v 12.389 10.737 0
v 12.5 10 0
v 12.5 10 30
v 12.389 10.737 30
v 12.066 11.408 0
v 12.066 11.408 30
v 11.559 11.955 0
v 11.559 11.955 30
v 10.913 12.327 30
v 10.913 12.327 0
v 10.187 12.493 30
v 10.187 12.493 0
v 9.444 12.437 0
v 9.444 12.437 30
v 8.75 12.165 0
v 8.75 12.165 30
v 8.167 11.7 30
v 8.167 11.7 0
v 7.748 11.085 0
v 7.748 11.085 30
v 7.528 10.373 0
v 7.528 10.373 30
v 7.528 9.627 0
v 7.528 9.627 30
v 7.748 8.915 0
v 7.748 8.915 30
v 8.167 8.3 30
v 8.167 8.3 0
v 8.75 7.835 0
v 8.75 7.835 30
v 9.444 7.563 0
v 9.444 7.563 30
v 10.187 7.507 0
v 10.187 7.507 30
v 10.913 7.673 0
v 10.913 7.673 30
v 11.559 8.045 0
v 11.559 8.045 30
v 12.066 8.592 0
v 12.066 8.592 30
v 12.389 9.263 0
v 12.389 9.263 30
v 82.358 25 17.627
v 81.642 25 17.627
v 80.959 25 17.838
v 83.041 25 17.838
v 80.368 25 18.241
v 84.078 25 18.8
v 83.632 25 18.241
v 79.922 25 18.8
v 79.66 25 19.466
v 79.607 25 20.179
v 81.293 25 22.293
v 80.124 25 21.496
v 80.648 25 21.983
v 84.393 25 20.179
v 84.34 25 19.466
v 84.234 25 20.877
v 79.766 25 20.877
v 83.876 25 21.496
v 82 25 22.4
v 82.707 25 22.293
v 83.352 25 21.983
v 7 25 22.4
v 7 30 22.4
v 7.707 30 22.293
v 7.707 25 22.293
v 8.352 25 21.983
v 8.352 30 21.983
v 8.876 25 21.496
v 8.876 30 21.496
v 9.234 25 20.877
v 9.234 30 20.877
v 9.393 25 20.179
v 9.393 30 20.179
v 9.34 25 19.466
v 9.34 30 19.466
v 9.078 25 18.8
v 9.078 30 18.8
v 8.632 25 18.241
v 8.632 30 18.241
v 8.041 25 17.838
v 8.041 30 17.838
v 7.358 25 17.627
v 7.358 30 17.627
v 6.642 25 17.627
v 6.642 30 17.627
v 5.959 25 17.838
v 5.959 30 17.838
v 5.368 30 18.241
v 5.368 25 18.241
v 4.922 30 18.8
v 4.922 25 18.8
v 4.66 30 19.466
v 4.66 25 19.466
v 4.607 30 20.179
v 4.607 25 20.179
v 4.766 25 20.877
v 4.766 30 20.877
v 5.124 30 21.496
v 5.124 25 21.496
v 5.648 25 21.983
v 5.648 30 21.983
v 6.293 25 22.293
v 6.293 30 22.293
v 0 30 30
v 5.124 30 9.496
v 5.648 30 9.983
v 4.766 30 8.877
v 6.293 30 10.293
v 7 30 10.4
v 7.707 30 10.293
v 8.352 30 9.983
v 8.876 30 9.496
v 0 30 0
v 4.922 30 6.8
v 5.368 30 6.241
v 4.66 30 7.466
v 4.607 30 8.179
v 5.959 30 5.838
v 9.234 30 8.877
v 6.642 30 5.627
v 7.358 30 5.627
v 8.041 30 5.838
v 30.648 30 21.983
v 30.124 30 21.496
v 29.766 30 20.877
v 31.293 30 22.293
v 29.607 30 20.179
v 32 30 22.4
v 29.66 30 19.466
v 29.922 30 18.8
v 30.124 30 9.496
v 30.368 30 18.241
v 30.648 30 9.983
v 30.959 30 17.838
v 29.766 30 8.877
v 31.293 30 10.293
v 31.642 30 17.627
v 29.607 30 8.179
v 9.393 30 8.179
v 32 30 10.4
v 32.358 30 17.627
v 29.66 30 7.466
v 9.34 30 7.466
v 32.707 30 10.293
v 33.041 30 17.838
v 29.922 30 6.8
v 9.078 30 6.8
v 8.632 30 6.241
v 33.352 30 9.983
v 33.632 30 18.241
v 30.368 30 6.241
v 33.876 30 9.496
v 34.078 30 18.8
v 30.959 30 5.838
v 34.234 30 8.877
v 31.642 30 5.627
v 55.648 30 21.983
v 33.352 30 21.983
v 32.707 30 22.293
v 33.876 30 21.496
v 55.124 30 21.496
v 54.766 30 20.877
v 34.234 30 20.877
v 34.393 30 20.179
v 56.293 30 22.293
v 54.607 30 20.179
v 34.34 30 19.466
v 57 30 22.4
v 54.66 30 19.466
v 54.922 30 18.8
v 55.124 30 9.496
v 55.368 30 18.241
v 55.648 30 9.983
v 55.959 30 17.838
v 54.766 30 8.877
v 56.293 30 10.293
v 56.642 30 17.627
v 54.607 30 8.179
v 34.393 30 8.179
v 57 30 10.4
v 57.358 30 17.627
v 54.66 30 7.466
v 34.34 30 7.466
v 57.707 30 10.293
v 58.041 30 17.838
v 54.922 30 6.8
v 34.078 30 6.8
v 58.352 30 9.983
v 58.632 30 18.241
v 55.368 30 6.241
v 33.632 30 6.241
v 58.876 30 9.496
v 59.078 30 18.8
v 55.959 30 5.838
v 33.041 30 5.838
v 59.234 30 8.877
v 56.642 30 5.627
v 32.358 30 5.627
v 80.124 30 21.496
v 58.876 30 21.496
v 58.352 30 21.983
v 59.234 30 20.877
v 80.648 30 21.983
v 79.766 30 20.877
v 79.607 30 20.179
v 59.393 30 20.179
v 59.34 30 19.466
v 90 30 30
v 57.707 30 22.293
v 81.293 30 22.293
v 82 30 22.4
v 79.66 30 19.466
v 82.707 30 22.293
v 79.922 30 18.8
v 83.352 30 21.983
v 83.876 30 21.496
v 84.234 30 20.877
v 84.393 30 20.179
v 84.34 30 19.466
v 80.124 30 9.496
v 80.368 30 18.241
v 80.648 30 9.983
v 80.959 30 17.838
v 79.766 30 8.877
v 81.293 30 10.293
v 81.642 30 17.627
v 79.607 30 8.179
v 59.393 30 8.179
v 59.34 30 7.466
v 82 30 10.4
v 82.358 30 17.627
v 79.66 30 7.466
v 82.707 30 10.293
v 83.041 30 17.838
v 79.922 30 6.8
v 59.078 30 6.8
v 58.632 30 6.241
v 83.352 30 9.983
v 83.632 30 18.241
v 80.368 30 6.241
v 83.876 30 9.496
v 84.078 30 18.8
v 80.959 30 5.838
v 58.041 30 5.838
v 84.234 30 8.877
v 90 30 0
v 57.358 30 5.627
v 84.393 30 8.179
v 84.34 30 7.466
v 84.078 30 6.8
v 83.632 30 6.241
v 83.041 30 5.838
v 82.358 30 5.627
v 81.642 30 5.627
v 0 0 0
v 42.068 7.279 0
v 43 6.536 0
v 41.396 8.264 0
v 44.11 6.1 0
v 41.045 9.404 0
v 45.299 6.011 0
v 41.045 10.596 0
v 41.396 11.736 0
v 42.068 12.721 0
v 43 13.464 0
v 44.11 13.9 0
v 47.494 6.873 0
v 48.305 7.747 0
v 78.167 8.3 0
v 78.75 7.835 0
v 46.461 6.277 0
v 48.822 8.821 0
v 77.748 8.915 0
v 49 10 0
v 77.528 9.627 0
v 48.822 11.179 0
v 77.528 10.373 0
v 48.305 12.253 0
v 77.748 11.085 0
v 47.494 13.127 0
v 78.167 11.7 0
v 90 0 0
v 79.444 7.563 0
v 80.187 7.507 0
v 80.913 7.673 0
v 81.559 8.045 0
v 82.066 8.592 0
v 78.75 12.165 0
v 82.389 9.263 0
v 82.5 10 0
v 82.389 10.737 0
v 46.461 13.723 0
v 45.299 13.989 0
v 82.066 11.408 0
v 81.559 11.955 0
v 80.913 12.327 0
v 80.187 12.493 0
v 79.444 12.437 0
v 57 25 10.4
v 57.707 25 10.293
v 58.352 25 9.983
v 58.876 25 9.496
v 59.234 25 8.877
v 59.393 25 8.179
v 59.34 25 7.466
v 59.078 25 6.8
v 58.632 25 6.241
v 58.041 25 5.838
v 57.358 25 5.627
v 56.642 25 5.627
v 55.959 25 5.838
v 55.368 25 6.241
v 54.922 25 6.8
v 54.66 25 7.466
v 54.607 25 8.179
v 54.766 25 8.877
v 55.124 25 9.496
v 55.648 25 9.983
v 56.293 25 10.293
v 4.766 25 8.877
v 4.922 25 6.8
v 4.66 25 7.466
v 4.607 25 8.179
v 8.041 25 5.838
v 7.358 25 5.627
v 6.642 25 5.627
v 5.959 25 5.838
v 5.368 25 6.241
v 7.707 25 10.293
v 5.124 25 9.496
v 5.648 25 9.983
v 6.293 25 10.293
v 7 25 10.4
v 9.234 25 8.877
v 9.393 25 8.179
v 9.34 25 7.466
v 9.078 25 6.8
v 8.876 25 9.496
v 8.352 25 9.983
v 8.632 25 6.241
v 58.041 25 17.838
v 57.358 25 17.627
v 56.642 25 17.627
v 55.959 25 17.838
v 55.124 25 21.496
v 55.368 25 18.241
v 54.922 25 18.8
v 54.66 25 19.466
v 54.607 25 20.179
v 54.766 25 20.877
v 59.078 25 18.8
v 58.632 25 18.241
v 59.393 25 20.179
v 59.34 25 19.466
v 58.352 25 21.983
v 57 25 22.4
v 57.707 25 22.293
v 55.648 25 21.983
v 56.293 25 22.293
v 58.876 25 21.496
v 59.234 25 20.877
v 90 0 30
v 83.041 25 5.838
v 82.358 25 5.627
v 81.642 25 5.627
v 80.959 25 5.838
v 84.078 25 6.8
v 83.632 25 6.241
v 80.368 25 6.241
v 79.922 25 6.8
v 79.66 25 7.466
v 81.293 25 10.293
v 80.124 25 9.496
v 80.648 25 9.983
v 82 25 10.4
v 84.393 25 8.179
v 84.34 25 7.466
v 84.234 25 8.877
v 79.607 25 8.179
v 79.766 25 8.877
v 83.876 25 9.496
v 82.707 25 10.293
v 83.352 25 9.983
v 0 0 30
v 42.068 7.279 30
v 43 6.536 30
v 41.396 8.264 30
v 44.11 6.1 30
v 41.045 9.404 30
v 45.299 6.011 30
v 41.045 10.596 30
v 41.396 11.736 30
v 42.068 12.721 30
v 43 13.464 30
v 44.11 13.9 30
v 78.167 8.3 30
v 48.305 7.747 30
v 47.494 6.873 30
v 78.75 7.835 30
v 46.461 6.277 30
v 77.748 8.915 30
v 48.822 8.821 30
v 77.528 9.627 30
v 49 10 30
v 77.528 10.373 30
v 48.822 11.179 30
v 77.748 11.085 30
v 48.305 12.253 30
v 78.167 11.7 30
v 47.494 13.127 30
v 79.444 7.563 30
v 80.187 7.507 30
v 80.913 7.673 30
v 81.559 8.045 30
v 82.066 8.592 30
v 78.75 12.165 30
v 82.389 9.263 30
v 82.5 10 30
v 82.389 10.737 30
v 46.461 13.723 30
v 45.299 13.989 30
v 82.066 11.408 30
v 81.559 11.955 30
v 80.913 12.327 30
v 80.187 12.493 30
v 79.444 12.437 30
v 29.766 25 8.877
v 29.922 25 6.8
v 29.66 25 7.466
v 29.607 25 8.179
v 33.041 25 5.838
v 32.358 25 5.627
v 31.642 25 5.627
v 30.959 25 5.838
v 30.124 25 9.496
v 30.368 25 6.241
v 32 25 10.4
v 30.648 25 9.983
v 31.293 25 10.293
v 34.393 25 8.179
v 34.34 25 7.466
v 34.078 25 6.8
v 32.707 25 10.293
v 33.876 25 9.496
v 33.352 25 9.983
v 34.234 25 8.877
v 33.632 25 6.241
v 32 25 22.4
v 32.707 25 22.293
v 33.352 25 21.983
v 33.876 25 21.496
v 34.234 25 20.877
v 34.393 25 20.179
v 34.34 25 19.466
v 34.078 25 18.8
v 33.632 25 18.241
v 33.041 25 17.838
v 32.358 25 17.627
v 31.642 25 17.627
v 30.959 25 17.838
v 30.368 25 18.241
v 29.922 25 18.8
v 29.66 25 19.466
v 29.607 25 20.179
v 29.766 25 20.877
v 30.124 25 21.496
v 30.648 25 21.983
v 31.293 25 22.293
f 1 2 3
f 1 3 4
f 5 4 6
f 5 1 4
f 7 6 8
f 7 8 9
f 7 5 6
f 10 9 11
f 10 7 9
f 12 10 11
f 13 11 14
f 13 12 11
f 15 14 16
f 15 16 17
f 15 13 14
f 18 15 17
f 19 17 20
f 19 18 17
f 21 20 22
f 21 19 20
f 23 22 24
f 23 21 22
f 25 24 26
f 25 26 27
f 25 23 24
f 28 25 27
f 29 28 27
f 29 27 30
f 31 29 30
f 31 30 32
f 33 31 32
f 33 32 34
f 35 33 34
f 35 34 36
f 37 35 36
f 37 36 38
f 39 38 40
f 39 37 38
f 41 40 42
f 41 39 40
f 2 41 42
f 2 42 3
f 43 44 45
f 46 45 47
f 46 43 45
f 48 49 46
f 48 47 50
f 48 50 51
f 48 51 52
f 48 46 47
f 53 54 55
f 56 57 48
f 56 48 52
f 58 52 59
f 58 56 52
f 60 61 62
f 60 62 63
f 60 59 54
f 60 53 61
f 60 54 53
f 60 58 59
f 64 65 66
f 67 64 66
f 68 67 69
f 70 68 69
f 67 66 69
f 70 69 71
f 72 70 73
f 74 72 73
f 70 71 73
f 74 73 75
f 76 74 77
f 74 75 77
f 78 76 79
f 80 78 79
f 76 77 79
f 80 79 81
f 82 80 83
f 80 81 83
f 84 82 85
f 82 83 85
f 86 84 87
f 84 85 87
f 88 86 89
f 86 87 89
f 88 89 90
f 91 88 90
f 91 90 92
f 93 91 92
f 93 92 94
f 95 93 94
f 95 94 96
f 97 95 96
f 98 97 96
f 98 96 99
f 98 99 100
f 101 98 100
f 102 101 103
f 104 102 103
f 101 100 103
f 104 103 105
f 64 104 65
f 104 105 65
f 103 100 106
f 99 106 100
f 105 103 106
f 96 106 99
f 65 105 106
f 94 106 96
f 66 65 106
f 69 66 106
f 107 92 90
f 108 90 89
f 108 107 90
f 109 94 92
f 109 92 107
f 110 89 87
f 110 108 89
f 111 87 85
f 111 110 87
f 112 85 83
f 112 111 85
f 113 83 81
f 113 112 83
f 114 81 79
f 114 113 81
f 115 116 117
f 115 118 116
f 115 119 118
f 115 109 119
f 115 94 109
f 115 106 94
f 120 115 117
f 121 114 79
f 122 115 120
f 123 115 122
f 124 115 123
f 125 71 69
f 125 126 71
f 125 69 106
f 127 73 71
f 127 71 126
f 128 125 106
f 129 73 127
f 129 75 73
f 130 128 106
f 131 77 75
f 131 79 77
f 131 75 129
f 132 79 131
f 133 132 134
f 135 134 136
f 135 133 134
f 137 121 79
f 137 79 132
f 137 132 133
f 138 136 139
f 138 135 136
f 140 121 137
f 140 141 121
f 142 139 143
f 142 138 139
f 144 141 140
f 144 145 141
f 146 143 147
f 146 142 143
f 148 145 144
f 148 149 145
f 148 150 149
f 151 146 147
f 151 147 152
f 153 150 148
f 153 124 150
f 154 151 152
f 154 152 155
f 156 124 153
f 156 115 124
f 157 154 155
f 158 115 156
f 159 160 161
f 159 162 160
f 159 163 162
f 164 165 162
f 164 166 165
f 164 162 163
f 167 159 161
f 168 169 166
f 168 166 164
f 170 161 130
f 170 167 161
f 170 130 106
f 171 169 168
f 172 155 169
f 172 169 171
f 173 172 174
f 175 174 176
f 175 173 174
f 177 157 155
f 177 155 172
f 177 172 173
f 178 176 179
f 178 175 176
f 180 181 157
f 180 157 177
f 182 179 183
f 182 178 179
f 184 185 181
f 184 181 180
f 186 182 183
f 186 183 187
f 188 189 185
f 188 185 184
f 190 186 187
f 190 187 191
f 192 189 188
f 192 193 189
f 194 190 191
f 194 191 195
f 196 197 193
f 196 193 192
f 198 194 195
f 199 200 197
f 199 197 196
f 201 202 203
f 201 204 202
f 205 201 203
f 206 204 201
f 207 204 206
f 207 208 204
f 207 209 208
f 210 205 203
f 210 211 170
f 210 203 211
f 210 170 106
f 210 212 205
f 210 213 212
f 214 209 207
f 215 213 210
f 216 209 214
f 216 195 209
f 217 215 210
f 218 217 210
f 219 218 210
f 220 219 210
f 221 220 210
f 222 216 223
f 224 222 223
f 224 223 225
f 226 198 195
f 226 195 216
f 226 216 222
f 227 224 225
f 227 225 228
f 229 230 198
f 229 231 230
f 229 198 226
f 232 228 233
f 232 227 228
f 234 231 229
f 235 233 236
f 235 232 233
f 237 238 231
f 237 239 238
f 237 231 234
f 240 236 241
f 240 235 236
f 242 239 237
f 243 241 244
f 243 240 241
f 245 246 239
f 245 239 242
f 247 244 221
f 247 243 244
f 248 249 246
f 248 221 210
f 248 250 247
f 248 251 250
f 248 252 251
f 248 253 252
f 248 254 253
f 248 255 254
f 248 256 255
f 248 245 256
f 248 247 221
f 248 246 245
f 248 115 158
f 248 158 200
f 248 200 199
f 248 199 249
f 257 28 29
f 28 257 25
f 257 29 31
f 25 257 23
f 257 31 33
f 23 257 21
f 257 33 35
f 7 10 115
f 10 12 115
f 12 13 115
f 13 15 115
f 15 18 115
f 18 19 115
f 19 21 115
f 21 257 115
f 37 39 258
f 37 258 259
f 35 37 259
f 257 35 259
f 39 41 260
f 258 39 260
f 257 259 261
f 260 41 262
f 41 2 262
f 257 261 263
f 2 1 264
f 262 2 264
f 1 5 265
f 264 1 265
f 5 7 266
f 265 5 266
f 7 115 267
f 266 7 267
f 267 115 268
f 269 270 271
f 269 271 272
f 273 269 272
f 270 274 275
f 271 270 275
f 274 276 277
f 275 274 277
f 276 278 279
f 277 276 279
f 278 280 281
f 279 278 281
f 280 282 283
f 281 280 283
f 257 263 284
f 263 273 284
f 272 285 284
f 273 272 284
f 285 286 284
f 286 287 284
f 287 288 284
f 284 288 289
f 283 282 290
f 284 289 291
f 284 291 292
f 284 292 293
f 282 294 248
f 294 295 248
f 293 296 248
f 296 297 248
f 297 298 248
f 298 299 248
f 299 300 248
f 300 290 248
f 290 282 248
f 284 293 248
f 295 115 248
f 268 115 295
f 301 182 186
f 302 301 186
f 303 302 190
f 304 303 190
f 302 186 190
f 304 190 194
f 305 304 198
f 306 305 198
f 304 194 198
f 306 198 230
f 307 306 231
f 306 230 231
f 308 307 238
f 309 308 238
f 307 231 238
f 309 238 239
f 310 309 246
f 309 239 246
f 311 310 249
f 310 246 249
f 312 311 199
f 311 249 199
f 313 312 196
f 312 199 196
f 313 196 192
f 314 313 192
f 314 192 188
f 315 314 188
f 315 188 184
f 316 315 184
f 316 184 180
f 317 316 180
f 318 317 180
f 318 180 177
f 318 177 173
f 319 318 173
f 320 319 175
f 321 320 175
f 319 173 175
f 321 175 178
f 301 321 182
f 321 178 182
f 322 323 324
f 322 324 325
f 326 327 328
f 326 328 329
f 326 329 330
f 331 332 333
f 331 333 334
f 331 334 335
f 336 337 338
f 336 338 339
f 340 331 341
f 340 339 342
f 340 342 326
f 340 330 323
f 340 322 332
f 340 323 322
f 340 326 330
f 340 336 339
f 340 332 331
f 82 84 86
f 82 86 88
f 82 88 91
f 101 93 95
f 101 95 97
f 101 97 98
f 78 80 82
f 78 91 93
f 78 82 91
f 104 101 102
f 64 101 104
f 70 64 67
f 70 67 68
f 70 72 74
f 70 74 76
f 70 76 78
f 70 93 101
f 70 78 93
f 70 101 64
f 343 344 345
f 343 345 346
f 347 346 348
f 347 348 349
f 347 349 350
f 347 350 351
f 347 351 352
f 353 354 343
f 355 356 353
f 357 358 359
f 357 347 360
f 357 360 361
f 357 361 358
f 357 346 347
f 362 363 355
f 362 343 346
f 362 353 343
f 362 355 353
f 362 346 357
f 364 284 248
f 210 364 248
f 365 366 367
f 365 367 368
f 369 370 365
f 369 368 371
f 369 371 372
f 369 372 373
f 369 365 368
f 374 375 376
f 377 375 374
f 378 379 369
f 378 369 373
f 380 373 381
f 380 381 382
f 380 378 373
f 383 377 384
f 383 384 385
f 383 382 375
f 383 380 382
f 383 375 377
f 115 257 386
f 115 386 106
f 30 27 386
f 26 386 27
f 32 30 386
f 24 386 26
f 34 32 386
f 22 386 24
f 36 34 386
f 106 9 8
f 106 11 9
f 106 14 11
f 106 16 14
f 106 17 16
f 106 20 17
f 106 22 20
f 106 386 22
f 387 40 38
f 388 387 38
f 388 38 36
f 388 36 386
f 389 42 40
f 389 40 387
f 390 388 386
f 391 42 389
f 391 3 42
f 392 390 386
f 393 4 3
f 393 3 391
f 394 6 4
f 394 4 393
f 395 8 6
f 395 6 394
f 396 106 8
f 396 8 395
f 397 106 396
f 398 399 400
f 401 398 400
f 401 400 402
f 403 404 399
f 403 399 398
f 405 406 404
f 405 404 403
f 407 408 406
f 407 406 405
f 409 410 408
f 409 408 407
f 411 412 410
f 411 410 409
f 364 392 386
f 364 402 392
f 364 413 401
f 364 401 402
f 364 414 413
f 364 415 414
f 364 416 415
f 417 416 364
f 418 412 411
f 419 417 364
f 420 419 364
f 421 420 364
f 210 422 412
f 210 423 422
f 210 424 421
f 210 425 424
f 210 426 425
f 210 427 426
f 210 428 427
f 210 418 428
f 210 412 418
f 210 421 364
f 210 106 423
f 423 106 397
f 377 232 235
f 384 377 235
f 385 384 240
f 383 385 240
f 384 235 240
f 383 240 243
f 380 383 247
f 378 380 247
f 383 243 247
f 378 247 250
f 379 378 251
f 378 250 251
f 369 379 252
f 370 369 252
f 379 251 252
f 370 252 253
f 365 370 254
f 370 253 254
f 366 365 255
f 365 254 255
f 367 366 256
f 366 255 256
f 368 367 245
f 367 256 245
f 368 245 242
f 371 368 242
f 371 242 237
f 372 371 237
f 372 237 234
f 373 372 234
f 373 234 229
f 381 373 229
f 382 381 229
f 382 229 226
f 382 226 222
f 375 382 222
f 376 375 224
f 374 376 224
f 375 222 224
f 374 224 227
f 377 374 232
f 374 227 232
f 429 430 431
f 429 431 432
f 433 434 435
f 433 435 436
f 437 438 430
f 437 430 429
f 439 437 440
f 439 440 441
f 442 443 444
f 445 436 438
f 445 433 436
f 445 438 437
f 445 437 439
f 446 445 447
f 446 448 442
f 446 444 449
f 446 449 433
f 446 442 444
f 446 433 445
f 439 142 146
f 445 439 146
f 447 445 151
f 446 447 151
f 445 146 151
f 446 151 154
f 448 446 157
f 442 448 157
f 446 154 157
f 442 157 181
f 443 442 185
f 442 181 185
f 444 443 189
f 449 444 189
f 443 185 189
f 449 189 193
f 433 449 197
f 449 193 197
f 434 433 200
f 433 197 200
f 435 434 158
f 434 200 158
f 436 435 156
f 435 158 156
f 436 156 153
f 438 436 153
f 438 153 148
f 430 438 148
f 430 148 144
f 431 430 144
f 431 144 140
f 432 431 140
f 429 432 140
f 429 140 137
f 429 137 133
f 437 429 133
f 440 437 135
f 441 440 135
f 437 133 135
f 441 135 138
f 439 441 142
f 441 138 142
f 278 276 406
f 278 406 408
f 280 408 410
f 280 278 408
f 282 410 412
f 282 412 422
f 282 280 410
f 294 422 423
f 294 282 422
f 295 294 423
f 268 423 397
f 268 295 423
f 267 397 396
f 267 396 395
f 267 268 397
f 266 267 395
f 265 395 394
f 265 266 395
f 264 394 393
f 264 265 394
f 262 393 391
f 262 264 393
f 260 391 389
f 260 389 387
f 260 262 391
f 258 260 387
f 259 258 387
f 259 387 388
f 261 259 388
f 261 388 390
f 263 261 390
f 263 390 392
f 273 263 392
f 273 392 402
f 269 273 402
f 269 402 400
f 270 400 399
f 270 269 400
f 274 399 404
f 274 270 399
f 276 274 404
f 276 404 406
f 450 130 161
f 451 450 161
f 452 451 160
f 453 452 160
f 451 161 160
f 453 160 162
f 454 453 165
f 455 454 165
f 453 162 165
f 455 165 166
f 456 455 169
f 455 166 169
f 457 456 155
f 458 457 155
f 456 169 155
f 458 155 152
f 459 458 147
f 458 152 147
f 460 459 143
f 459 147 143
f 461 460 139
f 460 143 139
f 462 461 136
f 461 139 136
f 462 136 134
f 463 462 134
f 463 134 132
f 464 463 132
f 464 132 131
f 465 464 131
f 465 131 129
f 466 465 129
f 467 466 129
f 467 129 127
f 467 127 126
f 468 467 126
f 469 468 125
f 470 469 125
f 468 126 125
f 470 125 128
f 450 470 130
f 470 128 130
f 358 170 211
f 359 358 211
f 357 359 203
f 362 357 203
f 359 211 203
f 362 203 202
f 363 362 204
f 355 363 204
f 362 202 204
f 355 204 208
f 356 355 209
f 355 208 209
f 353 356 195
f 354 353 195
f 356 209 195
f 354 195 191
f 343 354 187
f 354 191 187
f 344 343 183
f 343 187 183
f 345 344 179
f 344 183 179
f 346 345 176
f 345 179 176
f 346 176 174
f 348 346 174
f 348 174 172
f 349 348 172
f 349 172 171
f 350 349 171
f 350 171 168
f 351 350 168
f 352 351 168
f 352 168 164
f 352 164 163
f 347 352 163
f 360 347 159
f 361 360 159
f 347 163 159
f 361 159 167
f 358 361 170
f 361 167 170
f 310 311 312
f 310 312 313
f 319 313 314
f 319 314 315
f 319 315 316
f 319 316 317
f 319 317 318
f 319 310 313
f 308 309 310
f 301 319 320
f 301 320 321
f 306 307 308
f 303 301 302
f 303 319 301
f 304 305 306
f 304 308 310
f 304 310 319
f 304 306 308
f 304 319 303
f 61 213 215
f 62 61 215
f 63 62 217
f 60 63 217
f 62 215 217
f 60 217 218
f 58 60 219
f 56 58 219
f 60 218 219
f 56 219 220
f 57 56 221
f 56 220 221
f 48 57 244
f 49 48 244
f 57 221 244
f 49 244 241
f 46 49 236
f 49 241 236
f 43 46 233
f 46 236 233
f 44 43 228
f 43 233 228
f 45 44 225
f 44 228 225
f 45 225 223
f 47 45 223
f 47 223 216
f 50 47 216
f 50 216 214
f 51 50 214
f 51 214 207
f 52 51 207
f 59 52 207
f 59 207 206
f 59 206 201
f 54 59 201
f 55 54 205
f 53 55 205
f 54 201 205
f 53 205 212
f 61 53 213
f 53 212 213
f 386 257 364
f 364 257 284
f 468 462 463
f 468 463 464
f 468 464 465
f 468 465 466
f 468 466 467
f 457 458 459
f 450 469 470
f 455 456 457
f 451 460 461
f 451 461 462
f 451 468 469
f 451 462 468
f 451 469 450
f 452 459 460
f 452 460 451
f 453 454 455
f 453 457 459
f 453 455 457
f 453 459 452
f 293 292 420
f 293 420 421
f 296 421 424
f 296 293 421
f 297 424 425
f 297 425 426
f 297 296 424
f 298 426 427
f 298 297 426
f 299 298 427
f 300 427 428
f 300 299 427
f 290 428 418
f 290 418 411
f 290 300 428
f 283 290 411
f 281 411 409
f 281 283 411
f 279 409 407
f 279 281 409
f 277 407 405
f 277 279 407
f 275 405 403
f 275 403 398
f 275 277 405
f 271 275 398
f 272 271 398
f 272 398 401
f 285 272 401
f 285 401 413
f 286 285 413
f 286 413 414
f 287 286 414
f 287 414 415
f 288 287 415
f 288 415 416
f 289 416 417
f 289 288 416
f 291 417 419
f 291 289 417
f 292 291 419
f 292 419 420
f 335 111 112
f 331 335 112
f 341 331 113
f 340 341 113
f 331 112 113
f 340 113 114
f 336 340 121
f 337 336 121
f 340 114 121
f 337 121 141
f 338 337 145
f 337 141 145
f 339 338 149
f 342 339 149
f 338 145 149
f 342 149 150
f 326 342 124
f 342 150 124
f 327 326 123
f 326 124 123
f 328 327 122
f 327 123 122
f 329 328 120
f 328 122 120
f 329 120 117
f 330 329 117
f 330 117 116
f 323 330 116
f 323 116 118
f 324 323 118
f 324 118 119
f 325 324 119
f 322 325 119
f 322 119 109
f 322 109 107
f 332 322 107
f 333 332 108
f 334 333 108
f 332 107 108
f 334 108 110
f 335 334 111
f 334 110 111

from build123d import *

# Parameters (mm, degrees)
SKETCH1_W           = 90
SKETCH1_H           = 30
SKETCH1_R           = 2.5
SKETCH1_R_2         = 4
BOSS_EXTRUDE1_DEPTH = 30
SKETCH4_R           = 2.4
CUT_EXTRUDE1_DEPTH  = 5


with BuildPart() as part:
    # Sketch1 → Boss-Extrude1 (new body)
    with BuildSketch(Plane.XY):
        with Locations((45, 15)):
            Rectangle(SKETCH1_W, SKETCH1_H)
        with Locations((10, 10)):
            Circle(SKETCH1_R, mode=Mode.SUBTRACT)
        with Locations((45, 10)):
            Circle(SKETCH1_R_2, mode=Mode.SUBTRACT)
        with Locations((80, 10)):
            Circle(SKETCH1_R, mode=Mode.SUBTRACT)
    extrude(amount=BOSS_EXTRUDE1_DEPTH)

    # Sketch4 → Cut-Extrude1 (cut)
    with BuildSketch(Plane(origin=(0, 30, 0), x_dir=(1, 0, 0), z_dir=(0, 1, 0))):
        with Locations(Location((7, -8, 0), (0, 0, 270))):
            Circle(SKETCH4_R)
        with Locations(Location((32, -8, 0), (0, 0, 270))):
            Circle(SKETCH4_R)
        with Locations(Location((57, -8, 0), (0, 0, 270))):
            Circle(SKETCH4_R)
        with Locations(Location((82, -8, 0), (0, 0, 270))):
            Circle(SKETCH4_R)
        with Locations(Location((32, -20, 0), (0, 0, 270))):
            Circle(SKETCH4_R)
        with Locations(Location((57, -20, 0), (0, 0, 270))):
            Circle(SKETCH4_R)
        with Locations(Location((82, -20, 0), (0, 0, 270))):
            Circle(SKETCH4_R)
        with Locations(Location((7, -20, 0), (0, 0, 270))):
            Circle(SKETCH4_R)
    extrude(amount=-CUT_EXTRUDE1_DEPTH, mode=Mode.SUBTRACT)


solid = part.part
